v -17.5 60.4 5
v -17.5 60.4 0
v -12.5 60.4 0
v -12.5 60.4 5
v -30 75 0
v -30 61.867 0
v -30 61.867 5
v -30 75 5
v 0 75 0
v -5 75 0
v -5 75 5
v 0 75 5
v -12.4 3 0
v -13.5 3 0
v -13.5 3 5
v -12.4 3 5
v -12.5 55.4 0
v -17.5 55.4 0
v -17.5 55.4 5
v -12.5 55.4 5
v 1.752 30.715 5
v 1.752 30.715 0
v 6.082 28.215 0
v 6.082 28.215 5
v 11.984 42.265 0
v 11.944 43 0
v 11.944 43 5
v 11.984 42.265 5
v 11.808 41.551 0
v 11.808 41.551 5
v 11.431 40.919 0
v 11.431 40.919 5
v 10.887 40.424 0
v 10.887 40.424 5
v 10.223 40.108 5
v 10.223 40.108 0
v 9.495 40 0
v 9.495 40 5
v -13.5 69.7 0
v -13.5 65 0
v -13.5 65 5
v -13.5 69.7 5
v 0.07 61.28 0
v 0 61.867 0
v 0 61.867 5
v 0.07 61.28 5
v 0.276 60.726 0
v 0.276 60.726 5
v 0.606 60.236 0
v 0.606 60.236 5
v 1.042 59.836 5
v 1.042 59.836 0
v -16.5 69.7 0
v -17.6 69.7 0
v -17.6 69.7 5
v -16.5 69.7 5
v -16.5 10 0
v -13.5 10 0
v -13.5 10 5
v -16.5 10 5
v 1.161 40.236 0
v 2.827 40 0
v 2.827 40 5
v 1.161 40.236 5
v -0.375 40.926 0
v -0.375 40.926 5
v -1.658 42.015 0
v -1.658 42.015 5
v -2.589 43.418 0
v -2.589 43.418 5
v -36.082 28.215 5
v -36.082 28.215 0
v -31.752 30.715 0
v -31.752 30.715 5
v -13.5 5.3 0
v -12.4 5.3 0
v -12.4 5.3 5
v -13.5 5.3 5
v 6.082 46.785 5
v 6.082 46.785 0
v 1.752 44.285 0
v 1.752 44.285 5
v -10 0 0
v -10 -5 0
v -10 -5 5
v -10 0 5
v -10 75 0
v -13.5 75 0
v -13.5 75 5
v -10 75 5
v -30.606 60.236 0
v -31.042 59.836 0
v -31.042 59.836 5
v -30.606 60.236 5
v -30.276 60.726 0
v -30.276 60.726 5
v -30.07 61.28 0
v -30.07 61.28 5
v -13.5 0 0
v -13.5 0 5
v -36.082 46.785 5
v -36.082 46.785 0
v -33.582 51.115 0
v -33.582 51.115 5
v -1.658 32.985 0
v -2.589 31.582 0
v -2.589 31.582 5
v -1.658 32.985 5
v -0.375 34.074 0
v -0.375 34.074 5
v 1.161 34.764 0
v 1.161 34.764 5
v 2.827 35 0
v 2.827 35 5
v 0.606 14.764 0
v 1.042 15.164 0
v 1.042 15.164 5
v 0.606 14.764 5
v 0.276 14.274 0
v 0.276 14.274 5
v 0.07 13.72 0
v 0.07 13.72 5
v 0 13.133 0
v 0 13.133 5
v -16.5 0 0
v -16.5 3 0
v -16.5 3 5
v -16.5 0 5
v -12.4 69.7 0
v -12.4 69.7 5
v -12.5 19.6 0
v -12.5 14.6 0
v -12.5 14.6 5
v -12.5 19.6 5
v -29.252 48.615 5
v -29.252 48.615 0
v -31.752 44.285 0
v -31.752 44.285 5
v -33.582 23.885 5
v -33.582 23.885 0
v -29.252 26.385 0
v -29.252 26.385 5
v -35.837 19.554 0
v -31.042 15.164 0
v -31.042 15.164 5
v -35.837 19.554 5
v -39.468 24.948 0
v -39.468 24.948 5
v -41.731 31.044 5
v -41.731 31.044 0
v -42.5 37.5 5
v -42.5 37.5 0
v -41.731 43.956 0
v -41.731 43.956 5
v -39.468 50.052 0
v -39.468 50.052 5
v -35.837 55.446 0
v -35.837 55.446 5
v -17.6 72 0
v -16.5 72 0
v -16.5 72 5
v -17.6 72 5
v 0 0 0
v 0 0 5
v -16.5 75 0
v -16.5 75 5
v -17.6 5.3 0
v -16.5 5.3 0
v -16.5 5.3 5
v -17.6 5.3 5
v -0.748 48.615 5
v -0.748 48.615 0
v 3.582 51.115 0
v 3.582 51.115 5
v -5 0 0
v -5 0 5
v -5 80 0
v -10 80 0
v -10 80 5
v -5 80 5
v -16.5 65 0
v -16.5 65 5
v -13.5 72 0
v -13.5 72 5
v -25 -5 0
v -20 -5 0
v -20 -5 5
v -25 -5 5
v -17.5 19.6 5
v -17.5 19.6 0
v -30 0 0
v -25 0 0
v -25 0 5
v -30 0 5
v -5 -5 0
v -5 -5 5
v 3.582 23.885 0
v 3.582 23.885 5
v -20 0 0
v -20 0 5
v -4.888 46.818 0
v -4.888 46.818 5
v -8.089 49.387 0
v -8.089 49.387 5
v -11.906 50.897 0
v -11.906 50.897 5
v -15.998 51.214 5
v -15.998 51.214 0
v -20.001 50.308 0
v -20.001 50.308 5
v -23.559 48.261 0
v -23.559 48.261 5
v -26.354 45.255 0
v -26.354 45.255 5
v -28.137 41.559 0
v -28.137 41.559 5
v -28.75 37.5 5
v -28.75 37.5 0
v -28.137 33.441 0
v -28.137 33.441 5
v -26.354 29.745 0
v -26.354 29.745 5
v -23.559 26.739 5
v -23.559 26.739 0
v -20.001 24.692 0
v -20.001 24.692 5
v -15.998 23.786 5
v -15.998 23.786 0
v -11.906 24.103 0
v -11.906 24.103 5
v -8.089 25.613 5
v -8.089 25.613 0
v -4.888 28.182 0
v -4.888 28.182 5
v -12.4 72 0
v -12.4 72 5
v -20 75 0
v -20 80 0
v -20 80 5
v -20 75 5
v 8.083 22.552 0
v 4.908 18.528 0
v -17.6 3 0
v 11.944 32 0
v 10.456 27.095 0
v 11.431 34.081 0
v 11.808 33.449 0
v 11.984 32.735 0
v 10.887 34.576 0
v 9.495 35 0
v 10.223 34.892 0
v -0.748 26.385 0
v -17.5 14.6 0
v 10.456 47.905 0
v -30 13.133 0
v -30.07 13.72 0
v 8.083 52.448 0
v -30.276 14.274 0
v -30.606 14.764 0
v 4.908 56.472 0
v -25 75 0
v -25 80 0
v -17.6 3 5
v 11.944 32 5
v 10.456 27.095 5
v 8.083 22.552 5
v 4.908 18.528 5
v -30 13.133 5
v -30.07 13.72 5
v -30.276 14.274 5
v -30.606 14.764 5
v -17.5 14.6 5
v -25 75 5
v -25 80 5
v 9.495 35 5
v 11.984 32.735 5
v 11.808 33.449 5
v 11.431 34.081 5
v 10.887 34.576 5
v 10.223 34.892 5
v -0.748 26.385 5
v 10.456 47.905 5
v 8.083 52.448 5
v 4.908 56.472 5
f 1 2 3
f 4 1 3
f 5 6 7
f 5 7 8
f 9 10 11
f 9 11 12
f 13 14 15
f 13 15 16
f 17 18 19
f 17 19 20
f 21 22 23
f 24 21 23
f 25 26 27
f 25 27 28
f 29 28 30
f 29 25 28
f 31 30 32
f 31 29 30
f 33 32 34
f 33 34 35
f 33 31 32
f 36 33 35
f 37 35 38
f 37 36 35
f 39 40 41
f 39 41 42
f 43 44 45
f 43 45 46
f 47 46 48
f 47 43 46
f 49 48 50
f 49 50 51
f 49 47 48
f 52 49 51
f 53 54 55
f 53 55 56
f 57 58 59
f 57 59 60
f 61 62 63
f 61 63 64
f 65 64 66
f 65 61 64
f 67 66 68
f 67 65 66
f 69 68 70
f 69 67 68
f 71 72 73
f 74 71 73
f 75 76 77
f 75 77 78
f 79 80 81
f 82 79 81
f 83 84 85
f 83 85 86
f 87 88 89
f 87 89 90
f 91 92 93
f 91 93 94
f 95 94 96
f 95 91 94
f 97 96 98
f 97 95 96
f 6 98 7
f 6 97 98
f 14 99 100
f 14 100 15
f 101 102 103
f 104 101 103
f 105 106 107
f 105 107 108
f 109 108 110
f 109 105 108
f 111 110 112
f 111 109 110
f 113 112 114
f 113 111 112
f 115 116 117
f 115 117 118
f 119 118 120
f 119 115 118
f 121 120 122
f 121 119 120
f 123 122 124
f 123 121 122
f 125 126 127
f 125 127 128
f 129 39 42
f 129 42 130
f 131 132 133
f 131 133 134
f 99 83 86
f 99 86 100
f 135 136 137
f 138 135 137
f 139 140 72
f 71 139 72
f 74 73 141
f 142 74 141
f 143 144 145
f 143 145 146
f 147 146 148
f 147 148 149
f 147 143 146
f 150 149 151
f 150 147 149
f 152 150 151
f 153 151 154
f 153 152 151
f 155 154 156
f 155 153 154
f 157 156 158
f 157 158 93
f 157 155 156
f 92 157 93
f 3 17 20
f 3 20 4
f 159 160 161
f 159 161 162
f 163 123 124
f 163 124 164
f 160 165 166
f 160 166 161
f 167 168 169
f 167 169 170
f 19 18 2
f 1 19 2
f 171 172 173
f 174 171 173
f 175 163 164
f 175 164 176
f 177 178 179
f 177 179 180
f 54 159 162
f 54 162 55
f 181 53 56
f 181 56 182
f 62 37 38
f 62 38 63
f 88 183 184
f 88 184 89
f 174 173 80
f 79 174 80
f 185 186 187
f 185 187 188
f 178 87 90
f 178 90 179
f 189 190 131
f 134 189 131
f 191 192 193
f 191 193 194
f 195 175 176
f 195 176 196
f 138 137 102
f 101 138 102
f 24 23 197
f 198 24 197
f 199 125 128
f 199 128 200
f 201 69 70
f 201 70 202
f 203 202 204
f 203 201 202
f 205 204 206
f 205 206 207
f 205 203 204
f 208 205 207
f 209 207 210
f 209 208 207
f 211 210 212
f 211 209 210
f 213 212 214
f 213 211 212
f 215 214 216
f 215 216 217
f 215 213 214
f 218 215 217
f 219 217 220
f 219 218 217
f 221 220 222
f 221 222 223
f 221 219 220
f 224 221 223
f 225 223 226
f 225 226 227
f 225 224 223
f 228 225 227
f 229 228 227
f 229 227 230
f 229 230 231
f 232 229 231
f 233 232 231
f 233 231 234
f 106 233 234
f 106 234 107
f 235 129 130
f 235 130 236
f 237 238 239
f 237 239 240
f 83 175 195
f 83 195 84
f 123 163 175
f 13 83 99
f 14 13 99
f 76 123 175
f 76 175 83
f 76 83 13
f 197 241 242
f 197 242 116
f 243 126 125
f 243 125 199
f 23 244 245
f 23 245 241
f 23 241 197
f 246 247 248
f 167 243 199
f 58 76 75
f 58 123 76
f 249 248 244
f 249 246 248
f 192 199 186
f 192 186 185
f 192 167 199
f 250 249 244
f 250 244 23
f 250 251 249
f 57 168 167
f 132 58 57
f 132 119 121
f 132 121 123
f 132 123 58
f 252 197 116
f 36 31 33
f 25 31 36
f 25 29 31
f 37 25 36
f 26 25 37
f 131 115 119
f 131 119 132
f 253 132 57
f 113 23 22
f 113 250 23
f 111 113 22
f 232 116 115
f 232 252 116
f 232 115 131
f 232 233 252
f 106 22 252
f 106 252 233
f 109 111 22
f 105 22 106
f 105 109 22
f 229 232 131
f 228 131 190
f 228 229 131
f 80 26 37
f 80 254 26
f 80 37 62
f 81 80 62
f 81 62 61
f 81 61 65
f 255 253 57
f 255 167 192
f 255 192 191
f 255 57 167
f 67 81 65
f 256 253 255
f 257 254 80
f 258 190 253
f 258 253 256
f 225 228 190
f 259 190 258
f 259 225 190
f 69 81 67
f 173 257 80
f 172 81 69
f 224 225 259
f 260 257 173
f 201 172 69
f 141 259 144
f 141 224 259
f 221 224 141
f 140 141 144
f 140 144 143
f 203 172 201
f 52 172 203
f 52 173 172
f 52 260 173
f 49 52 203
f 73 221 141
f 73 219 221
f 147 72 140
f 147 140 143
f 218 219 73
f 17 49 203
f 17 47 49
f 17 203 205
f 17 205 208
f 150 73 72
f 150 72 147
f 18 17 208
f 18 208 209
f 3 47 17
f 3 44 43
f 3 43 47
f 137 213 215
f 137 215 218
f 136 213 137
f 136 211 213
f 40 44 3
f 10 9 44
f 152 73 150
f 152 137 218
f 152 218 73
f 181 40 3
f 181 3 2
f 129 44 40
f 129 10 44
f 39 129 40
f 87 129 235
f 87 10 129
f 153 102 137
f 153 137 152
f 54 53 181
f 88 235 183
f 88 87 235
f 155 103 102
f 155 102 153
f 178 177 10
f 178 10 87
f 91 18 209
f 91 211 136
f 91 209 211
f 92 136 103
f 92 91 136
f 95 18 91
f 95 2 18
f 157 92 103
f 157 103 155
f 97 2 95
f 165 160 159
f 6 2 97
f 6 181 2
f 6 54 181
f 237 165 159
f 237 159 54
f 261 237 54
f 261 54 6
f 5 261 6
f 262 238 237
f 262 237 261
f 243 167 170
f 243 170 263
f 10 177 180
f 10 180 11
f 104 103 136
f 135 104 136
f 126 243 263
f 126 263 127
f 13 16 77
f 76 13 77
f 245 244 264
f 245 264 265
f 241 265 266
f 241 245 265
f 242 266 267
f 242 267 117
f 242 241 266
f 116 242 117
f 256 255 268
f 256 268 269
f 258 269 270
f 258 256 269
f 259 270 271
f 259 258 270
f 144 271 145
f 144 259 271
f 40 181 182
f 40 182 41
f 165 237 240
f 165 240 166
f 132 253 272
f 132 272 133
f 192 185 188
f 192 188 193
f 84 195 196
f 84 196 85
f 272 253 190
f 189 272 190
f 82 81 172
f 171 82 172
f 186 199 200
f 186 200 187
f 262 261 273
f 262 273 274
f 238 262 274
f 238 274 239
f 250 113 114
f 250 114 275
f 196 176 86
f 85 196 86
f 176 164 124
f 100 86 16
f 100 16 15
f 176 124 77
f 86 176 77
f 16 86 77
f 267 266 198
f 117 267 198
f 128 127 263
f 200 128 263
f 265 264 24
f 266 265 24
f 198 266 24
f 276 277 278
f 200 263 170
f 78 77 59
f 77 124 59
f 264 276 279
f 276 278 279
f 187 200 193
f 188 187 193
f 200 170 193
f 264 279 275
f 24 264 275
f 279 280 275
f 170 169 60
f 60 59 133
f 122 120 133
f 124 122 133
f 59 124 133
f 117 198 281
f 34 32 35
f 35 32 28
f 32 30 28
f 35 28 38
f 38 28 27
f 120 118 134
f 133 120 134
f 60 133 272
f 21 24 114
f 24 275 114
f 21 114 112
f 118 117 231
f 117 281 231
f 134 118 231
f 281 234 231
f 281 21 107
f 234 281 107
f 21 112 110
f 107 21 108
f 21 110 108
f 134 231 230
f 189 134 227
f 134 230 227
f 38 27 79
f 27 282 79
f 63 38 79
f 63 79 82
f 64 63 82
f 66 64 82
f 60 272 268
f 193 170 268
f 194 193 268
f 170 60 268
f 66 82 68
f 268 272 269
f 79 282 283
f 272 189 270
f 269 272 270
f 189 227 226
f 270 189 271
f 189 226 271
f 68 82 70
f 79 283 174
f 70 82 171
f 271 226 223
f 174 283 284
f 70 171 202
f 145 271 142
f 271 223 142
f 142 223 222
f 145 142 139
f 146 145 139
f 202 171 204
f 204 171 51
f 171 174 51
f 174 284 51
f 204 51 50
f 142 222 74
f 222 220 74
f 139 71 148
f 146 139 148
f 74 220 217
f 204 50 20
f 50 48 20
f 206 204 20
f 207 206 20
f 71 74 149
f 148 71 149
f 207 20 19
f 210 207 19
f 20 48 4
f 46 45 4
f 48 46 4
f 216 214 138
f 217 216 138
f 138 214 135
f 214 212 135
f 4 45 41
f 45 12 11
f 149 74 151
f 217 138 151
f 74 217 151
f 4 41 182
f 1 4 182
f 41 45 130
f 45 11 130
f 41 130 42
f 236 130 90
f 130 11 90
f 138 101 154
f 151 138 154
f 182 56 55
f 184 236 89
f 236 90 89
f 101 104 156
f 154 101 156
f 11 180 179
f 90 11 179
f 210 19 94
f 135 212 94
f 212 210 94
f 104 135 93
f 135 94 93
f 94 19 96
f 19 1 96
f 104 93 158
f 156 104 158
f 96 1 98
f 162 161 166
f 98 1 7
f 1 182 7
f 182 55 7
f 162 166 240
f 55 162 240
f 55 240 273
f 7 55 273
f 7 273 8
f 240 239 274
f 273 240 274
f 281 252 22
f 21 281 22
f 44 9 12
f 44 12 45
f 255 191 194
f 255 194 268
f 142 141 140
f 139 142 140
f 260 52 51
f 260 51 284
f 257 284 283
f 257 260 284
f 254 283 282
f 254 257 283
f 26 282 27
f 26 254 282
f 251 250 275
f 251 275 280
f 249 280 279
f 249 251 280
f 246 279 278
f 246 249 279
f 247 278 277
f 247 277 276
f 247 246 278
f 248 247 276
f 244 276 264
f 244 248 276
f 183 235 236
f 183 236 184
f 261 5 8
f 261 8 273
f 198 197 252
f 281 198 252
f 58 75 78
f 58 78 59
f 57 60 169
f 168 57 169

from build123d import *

# Parameters (mm, degrees)
ESQUISSE1_W        = 5
ESQUISSE1_H        = 5
BOSS_EXTRU_1_DEPTH = 5


with BuildPart() as part:
    # Esquisse1 → Boss.-Extru.1 (new body)
    with BuildSketch(Plane.XY):
        with BuildLine():
            Line((0, 0), (-5, 0))
            Line((-5, 0), (-5, -5))
            Line((-5, -5), (-10, -5))
            Line((-10, -5), (-10, 0))
            Line((-10, 0), (-13.5, 0))
            Line((-13.5, 0), (-13.5, 3))
            Line((-13.5, 3), (-12.4, 3))
            Line((-12.4, 3), (-12.4, 5.3))
            Line((-12.4, 5.3), (-13.5, 5.3))
            Line((-13.5, 5.3), (-13.5, 10))
            Line((-13.5, 10), (-16.5, 10))
            Line((-16.5, 10), (-16.5, 5.3))
            Line((-16.5, 5.3), (-17.6, 5.3))
            Line((-17.6, 5.3), (-17.6, 3))
            Line((-17.6, 3), (-16.5, 3))
            Line((-16.5, 3), (-16.5, 0))
            Line((-16.5, 0), (-20, 0))
            Line((-20, 0), (-20, -5))
            Line((-20, -5), (-25, -5))
            Line((-25, -5), (-25, 0))
            Line((-25, 0), (-30, 0))
            Line((-30, 0), (-30, 13.133014138))
            ThreePointArc((-30, 13.133014138), (-30.275608697, 14.274102799), (-31.041666667, 15.163596293))
            ThreePointArc((-31.041666667, 15.163596293), (-42.5, 37.5), (-31.041666667, 59.836403707))
            ThreePointArc((-31.041666667, 59.836403707), (-30.275608697, 60.725897201), (-30, 61.866985862))
            Line((-30, 61.866985862), (-30, 75))
            Line((-30, 75), (-25, 75))
            Line((-25, 75), (-25, 80))
            Line((-25, 80), (-20, 80))
            Line((-20, 80), (-20, 75))
            Line((-20, 75), (-16.5, 75))
            Line((-16.5, 75), (-16.5, 72))
            Line((-16.5, 72), (-17.6, 72))
            Line((-17.6, 72), (-17.6, 69.7))
            Line((-17.6, 69.7), (-16.5, 69.7))
            Line((-16.5, 69.7), (-16.5, 65))
            Line((-16.5, 65), (-13.5, 65))
            Line((-13.5, 65), (-13.5, 69.7))
            Line((-13.5, 69.7), (-12.4, 69.7))
            Line((-12.4, 69.7), (-12.4, 72))
            Line((-12.4, 72), (-13.5, 72))
            Line((-13.5, 72), (-13.5, 75))
            Line((-13.5, 75), (-10, 75))
            Line((-10, 75), (-10, 80))
            Line((-10, 80), (-5, 80))
            Line((-5, 80), (-5, 75))
            Line((-5, 75), (0, 75))
            Line((0, 75), (0, 61.866985862))
            ThreePointArc((0, 61.866985862), (0.275608697, 60.725897201), (1.041666667, 59.836403707))
            ThreePointArc((1.041666667, 59.836403707), (8.082814572, 52.447697864), (11.944387171, 43))
            ThreePointArc((11.944387171, 43), (11.431389101, 40.91886117), (9.494897428, 40))
            Line((9.494897428, 40), (2.827296486, 40))
            ThreePointArc((2.827296486, 40), (-0.374759815, 40.92586604), (-2.588591054, 43.417721519))
            ThreePointArc((-2.588591054, 43.417721519), (-28.75, 37.5), (-2.588591054, 31.582278481))
            ThreePointArc((-2.588591054, 31.582278481), (-0.374759815, 34.07413396), (2.827296486, 35))
            Line((2.827296486, 35), (9.494897428, 35))
            ThreePointArc((9.494897428, 35), (11.431389101, 34.08113883), (11.944387171, 32))
            ThreePointArc((11.944387171, 32), (8.082814572, 22.552302136), (1.041666667, 15.163596293))
            ThreePointArc((1.041666667, 15.163596293), (0.275608697, 14.274102799), (0, 13.133014138))
            Line((0, 13.133014138), (0, 0))
        make_face()
        with Locations((-15, 57.9)):
            Rectangle(ESQUISSE1_W, ESQUISSE1_H, mode=Mode.SUBTRACT)
        Polygon((3.581981747, 51.115063509), (6.081981747, 46.784936491), (1.751854728, 44.284936491), (-0.748145272, 48.615063509), align=None, mode=Mode.SUBTRACT)
        Polygon((6.081981747, 28.215063509), (3.581981747, 23.884936491), (-0.748145272, 26.384936491), (1.751854728, 30.715063509), align=None, mode=Mode.SUBTRACT)
        with Locations((-15, 17.1)):
            Rectangle(ESQUISSE1_W, ESQUISSE1_H, mode=Mode.SUBTRACT)
        Polygon((-33.581981747, 23.884936491), (-36.081981747, 28.215063509), (-31.751854728, 30.715063509), (-29.251854728, 26.384936491), align=None, mode=Mode.SUBTRACT)
        Polygon((-36.081981747, 46.784936491), (-33.581981747, 51.115063509), (-29.251854728, 48.615063509), (-31.751854728, 44.284936491), align=None, mode=Mode.SUBTRACT)
    extrude(amount=BOSS_EXTRU_1_DEPTH)


solid = part.part
